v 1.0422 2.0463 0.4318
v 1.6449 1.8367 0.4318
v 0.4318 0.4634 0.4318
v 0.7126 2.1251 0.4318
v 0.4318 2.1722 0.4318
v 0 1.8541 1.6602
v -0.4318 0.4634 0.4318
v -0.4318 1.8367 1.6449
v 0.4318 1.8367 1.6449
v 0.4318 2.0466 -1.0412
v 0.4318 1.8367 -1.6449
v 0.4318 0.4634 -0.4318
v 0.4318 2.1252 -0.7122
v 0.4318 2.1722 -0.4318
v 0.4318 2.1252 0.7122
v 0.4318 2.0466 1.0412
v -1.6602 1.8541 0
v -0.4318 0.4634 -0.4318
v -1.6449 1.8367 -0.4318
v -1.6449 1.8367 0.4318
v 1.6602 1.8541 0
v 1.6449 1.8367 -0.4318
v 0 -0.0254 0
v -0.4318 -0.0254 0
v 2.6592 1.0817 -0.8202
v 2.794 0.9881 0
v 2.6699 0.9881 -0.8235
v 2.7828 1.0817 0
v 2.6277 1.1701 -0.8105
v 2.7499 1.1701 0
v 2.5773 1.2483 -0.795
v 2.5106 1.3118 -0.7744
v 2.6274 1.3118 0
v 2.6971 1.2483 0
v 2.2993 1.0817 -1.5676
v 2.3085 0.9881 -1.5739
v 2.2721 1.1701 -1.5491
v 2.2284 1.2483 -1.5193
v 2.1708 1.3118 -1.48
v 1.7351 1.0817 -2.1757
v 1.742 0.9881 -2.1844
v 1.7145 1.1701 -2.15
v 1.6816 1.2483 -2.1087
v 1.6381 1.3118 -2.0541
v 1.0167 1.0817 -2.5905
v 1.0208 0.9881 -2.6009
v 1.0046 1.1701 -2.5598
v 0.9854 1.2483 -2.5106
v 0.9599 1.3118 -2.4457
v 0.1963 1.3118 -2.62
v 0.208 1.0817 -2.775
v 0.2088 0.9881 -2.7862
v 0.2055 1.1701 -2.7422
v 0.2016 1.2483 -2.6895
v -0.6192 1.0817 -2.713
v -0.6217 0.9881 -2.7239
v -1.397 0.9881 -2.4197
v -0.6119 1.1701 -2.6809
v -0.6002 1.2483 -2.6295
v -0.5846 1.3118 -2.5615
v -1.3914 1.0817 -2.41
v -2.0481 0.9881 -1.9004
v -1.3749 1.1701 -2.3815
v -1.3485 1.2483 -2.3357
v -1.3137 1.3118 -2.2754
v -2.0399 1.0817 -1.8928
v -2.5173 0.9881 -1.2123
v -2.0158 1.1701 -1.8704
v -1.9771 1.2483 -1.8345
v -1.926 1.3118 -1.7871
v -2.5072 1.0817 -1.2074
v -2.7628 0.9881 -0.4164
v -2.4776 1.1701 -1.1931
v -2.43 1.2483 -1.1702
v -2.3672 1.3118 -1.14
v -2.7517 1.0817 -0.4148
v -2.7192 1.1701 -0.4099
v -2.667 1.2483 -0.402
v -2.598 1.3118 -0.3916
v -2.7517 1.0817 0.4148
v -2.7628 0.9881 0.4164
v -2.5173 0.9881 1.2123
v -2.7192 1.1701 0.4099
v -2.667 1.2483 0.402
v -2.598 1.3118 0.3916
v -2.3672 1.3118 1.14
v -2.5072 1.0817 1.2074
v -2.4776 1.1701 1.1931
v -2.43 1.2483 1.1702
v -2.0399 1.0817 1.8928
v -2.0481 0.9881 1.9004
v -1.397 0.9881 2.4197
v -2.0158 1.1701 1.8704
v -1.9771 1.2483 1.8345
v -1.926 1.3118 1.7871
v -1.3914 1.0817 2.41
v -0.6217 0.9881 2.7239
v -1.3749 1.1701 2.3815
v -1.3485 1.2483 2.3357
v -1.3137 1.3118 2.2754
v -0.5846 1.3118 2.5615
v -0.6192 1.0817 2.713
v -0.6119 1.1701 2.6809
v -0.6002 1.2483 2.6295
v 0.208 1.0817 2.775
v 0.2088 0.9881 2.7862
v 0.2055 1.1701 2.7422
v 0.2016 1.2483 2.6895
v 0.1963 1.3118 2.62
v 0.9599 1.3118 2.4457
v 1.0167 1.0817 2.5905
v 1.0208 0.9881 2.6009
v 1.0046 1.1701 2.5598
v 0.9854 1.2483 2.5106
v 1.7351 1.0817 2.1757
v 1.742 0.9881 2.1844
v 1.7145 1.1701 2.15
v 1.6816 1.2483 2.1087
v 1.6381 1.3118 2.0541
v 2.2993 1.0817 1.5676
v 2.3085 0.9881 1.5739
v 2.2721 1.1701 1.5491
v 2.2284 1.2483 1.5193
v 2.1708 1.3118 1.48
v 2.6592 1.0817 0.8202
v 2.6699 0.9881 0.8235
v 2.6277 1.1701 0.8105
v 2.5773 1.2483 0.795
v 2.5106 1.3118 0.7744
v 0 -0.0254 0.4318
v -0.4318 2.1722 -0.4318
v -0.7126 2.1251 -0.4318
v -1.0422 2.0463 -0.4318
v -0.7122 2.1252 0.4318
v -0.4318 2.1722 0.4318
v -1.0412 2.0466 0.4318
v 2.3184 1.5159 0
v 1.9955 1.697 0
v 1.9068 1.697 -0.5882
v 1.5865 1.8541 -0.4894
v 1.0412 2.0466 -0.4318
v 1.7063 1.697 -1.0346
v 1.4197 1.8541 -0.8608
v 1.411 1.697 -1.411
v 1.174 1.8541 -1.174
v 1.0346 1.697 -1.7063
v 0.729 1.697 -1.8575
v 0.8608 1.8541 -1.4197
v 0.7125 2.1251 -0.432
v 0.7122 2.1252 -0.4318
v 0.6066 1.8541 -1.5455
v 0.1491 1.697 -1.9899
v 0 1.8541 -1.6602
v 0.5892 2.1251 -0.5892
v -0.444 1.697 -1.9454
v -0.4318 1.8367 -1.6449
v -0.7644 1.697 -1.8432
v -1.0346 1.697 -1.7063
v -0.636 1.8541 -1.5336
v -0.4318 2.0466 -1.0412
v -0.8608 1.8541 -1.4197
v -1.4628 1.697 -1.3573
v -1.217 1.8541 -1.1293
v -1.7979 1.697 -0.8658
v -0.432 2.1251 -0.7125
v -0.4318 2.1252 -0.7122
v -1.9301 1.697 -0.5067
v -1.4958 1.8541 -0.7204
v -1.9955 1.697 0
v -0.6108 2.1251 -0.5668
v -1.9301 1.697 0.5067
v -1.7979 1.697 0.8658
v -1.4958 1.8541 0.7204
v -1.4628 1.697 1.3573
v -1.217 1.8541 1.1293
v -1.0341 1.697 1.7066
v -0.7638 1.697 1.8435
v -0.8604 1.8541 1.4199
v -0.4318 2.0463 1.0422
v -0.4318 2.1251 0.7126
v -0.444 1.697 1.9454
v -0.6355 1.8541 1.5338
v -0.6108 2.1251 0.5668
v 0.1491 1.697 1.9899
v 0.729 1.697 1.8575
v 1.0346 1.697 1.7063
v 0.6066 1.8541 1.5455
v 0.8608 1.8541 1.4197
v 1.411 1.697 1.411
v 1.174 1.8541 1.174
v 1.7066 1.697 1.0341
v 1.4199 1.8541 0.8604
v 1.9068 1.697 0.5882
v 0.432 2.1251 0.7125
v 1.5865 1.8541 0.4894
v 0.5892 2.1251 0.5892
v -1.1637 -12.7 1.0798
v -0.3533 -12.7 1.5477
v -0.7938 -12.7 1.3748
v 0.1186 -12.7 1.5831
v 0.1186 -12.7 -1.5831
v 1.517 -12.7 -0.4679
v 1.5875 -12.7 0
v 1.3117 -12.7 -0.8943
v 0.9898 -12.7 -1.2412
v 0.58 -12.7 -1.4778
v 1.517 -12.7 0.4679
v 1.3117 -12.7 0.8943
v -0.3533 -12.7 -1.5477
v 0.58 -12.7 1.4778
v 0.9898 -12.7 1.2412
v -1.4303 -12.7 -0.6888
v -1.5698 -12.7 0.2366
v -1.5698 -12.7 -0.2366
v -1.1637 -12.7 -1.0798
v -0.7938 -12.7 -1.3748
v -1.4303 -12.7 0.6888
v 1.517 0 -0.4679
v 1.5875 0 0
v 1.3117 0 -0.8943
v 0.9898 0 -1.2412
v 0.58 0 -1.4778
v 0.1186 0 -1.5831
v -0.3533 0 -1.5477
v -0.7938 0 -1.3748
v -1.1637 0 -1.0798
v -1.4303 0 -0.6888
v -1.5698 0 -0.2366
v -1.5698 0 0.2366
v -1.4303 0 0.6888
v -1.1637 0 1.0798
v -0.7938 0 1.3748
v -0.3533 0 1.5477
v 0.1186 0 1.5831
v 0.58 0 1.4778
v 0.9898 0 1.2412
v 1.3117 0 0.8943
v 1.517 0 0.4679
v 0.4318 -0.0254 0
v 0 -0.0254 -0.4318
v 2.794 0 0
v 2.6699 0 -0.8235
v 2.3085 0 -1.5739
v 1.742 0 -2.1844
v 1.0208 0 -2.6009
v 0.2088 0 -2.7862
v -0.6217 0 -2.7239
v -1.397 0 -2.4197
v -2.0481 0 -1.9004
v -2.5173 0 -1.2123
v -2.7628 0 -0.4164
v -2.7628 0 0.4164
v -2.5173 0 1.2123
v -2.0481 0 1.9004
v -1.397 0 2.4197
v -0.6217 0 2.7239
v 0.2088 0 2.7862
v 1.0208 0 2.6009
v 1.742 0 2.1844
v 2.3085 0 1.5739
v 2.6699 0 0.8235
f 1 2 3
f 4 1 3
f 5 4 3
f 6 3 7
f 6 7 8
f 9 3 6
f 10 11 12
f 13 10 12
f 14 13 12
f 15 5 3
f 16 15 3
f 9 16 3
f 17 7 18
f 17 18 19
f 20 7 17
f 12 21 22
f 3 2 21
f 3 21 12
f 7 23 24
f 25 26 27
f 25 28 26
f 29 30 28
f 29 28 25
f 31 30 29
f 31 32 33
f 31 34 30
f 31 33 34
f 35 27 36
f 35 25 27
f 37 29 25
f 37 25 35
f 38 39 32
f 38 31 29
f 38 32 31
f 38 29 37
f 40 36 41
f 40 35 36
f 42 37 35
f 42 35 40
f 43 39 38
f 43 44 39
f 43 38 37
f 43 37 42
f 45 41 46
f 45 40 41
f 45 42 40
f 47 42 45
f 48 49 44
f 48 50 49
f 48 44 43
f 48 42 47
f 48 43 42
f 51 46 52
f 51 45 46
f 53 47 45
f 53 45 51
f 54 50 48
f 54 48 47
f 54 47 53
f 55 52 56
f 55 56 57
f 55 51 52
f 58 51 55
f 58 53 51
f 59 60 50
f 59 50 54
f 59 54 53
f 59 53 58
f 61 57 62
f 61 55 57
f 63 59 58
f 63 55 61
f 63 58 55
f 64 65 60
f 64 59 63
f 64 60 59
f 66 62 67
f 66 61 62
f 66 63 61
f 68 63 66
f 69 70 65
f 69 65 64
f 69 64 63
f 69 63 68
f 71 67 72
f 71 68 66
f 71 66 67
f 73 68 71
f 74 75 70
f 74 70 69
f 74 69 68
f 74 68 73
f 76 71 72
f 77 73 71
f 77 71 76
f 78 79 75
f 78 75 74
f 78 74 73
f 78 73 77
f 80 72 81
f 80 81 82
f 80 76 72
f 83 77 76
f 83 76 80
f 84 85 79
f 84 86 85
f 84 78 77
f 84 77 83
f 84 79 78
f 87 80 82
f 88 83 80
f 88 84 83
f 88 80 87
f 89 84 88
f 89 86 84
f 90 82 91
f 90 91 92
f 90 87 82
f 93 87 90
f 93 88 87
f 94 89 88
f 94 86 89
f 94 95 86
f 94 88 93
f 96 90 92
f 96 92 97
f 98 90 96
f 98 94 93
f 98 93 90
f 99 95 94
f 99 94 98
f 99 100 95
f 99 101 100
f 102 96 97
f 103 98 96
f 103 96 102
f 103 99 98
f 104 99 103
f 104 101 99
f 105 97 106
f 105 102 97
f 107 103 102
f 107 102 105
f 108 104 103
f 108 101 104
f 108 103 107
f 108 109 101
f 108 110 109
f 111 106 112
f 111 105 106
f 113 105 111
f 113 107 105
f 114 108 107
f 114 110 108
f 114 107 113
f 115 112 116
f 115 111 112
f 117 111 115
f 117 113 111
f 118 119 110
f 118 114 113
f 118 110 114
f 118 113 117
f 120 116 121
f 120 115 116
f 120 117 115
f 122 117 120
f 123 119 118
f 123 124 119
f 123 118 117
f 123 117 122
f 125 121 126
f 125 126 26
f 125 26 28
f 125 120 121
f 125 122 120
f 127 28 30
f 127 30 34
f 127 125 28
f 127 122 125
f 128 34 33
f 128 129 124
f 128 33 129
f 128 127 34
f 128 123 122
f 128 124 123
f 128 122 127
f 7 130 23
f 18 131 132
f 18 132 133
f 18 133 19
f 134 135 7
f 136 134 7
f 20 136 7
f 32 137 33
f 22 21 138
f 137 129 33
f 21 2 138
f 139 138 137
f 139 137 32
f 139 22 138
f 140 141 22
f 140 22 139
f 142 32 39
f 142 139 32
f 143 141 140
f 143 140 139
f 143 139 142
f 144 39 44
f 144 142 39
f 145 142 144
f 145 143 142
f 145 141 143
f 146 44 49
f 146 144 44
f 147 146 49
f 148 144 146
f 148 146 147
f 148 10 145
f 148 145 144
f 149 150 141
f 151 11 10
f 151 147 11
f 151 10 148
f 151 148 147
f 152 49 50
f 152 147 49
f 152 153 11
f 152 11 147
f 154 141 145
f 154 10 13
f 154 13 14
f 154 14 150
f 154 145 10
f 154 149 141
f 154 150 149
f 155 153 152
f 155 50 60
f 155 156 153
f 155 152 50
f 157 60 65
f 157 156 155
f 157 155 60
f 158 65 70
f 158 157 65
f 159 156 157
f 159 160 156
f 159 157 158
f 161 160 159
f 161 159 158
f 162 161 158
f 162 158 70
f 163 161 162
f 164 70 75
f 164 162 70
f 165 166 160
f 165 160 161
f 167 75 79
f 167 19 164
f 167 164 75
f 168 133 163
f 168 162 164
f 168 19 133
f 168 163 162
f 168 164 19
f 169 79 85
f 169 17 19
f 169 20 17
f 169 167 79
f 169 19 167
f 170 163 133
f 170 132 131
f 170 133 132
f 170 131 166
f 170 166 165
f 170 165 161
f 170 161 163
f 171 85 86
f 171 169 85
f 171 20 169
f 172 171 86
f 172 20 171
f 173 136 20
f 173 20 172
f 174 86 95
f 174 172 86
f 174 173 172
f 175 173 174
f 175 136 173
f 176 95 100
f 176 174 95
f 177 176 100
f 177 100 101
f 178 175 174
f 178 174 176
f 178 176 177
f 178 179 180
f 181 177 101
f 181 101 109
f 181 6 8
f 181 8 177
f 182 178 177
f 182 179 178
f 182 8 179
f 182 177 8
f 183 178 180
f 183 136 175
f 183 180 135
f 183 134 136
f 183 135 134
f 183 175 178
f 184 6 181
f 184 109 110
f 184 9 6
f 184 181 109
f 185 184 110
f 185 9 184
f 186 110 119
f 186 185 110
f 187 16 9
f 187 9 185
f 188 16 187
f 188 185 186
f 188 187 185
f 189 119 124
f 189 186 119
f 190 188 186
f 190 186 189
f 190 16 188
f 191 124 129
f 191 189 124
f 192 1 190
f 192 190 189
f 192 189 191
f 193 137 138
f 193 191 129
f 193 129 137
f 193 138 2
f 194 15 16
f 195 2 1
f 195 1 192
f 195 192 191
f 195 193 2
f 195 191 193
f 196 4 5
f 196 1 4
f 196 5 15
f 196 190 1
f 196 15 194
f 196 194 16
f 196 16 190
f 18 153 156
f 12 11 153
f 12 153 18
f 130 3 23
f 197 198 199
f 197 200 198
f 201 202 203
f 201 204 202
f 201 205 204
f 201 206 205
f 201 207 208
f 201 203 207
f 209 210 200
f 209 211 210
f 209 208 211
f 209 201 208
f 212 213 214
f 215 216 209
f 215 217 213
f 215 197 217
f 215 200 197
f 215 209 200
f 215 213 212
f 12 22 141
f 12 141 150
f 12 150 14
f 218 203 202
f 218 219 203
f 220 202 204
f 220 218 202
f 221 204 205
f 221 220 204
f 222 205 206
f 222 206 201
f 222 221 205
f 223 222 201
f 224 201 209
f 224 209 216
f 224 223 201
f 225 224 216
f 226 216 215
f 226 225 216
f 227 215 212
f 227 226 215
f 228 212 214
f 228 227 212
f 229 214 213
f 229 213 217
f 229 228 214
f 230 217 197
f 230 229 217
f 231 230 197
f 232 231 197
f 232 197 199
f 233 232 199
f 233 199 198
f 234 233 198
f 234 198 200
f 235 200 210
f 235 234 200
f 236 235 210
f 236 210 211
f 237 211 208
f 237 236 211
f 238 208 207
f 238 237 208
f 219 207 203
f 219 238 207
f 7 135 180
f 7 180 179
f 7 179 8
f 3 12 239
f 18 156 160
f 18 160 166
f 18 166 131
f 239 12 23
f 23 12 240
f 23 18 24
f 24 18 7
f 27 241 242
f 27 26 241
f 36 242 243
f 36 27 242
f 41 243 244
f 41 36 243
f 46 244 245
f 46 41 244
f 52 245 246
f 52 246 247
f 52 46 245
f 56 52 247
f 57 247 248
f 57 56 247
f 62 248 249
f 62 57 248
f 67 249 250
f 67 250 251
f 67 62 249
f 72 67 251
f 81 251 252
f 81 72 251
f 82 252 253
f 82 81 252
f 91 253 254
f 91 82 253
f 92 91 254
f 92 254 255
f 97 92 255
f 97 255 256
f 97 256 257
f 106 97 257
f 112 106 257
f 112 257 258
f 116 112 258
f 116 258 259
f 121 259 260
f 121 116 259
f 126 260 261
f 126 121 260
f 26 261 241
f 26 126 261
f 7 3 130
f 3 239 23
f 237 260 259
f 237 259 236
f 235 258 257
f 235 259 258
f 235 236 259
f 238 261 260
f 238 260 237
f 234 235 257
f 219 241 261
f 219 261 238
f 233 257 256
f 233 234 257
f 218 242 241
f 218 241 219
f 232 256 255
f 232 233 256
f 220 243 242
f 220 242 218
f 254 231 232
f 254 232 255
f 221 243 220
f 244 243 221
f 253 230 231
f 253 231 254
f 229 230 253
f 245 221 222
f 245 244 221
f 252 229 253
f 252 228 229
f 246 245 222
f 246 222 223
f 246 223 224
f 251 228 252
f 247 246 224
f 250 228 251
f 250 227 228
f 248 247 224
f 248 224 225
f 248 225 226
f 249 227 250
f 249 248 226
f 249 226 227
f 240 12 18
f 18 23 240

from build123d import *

# Parameters (mm, degrees)
SKETCH2_W          = 1.5875
SKETCH2_H          = 12.7
CUT_EXTRUDE1_DEPTH = 0.4318
CUT_EXTRUDE2_DEPTH = 0.4318


with BuildPart() as part:
    # Sketch1 → Base-Revolve (revolve)
    with BuildSketch(Plane.XY):
        with BuildLine():
            Line((0, 0), (2.794, 0))
            Line((2.794, 0), (2.794, 0.988051987))
            ThreePointArc((2.794, 0.988051987), (2.749892337, 1.170116122), (2.627350358, 1.311806977))
            ThreePointArc((2.627350358, 1.311806977), (1.379087386, 1.963971758), (0, 2.249624225))
            Line((0, 2.249624225), (0, 0))
        make_face()
    revolve(axis=Axis((0, 0, 0), (0, 1, 0)))

    # Sketch2 → Boss-Revolve1 (revolve)
    with BuildSketch(Plane.XY):
        with Locations((0.79375, -6.35)):
            Rectangle(SKETCH2_W, SKETCH2_H)
    revolve(axis=Axis((0, 0, 0), (0, 1, 0)))

    # Sketch3 → Cut-Extrude1 (cut, symmetric)
    with BuildSketch(Plane.XY):
        Polygon((-2.0193, 3.3909), (2.0193, 3.3909), (2.0193, 2.2606), (0, -0.0254), (-2.0193, 2.2606), align=None)
    extrude(amount=CUT_EXTRUDE1_DEPTH, both=True, mode=Mode.SUBTRACT)

    # Sketch4 → Cut-Extrude2 (cut, symmetric)
    with BuildSketch(Plane(origin=(0, 0, 0), x_dir=(0, 0, -1), z_dir=(1, 0, 0))):
        Polygon((-2.0193, 3.3909), (2.0193, 3.3909), (2.0193, 2.2606), (0, -0.0254), (-2.0193, 2.2606), align=None)
    extrude(amount=CUT_EXTRUDE2_DEPTH, both=True, mode=Mode.SUBTRACT)


solid = part.part
